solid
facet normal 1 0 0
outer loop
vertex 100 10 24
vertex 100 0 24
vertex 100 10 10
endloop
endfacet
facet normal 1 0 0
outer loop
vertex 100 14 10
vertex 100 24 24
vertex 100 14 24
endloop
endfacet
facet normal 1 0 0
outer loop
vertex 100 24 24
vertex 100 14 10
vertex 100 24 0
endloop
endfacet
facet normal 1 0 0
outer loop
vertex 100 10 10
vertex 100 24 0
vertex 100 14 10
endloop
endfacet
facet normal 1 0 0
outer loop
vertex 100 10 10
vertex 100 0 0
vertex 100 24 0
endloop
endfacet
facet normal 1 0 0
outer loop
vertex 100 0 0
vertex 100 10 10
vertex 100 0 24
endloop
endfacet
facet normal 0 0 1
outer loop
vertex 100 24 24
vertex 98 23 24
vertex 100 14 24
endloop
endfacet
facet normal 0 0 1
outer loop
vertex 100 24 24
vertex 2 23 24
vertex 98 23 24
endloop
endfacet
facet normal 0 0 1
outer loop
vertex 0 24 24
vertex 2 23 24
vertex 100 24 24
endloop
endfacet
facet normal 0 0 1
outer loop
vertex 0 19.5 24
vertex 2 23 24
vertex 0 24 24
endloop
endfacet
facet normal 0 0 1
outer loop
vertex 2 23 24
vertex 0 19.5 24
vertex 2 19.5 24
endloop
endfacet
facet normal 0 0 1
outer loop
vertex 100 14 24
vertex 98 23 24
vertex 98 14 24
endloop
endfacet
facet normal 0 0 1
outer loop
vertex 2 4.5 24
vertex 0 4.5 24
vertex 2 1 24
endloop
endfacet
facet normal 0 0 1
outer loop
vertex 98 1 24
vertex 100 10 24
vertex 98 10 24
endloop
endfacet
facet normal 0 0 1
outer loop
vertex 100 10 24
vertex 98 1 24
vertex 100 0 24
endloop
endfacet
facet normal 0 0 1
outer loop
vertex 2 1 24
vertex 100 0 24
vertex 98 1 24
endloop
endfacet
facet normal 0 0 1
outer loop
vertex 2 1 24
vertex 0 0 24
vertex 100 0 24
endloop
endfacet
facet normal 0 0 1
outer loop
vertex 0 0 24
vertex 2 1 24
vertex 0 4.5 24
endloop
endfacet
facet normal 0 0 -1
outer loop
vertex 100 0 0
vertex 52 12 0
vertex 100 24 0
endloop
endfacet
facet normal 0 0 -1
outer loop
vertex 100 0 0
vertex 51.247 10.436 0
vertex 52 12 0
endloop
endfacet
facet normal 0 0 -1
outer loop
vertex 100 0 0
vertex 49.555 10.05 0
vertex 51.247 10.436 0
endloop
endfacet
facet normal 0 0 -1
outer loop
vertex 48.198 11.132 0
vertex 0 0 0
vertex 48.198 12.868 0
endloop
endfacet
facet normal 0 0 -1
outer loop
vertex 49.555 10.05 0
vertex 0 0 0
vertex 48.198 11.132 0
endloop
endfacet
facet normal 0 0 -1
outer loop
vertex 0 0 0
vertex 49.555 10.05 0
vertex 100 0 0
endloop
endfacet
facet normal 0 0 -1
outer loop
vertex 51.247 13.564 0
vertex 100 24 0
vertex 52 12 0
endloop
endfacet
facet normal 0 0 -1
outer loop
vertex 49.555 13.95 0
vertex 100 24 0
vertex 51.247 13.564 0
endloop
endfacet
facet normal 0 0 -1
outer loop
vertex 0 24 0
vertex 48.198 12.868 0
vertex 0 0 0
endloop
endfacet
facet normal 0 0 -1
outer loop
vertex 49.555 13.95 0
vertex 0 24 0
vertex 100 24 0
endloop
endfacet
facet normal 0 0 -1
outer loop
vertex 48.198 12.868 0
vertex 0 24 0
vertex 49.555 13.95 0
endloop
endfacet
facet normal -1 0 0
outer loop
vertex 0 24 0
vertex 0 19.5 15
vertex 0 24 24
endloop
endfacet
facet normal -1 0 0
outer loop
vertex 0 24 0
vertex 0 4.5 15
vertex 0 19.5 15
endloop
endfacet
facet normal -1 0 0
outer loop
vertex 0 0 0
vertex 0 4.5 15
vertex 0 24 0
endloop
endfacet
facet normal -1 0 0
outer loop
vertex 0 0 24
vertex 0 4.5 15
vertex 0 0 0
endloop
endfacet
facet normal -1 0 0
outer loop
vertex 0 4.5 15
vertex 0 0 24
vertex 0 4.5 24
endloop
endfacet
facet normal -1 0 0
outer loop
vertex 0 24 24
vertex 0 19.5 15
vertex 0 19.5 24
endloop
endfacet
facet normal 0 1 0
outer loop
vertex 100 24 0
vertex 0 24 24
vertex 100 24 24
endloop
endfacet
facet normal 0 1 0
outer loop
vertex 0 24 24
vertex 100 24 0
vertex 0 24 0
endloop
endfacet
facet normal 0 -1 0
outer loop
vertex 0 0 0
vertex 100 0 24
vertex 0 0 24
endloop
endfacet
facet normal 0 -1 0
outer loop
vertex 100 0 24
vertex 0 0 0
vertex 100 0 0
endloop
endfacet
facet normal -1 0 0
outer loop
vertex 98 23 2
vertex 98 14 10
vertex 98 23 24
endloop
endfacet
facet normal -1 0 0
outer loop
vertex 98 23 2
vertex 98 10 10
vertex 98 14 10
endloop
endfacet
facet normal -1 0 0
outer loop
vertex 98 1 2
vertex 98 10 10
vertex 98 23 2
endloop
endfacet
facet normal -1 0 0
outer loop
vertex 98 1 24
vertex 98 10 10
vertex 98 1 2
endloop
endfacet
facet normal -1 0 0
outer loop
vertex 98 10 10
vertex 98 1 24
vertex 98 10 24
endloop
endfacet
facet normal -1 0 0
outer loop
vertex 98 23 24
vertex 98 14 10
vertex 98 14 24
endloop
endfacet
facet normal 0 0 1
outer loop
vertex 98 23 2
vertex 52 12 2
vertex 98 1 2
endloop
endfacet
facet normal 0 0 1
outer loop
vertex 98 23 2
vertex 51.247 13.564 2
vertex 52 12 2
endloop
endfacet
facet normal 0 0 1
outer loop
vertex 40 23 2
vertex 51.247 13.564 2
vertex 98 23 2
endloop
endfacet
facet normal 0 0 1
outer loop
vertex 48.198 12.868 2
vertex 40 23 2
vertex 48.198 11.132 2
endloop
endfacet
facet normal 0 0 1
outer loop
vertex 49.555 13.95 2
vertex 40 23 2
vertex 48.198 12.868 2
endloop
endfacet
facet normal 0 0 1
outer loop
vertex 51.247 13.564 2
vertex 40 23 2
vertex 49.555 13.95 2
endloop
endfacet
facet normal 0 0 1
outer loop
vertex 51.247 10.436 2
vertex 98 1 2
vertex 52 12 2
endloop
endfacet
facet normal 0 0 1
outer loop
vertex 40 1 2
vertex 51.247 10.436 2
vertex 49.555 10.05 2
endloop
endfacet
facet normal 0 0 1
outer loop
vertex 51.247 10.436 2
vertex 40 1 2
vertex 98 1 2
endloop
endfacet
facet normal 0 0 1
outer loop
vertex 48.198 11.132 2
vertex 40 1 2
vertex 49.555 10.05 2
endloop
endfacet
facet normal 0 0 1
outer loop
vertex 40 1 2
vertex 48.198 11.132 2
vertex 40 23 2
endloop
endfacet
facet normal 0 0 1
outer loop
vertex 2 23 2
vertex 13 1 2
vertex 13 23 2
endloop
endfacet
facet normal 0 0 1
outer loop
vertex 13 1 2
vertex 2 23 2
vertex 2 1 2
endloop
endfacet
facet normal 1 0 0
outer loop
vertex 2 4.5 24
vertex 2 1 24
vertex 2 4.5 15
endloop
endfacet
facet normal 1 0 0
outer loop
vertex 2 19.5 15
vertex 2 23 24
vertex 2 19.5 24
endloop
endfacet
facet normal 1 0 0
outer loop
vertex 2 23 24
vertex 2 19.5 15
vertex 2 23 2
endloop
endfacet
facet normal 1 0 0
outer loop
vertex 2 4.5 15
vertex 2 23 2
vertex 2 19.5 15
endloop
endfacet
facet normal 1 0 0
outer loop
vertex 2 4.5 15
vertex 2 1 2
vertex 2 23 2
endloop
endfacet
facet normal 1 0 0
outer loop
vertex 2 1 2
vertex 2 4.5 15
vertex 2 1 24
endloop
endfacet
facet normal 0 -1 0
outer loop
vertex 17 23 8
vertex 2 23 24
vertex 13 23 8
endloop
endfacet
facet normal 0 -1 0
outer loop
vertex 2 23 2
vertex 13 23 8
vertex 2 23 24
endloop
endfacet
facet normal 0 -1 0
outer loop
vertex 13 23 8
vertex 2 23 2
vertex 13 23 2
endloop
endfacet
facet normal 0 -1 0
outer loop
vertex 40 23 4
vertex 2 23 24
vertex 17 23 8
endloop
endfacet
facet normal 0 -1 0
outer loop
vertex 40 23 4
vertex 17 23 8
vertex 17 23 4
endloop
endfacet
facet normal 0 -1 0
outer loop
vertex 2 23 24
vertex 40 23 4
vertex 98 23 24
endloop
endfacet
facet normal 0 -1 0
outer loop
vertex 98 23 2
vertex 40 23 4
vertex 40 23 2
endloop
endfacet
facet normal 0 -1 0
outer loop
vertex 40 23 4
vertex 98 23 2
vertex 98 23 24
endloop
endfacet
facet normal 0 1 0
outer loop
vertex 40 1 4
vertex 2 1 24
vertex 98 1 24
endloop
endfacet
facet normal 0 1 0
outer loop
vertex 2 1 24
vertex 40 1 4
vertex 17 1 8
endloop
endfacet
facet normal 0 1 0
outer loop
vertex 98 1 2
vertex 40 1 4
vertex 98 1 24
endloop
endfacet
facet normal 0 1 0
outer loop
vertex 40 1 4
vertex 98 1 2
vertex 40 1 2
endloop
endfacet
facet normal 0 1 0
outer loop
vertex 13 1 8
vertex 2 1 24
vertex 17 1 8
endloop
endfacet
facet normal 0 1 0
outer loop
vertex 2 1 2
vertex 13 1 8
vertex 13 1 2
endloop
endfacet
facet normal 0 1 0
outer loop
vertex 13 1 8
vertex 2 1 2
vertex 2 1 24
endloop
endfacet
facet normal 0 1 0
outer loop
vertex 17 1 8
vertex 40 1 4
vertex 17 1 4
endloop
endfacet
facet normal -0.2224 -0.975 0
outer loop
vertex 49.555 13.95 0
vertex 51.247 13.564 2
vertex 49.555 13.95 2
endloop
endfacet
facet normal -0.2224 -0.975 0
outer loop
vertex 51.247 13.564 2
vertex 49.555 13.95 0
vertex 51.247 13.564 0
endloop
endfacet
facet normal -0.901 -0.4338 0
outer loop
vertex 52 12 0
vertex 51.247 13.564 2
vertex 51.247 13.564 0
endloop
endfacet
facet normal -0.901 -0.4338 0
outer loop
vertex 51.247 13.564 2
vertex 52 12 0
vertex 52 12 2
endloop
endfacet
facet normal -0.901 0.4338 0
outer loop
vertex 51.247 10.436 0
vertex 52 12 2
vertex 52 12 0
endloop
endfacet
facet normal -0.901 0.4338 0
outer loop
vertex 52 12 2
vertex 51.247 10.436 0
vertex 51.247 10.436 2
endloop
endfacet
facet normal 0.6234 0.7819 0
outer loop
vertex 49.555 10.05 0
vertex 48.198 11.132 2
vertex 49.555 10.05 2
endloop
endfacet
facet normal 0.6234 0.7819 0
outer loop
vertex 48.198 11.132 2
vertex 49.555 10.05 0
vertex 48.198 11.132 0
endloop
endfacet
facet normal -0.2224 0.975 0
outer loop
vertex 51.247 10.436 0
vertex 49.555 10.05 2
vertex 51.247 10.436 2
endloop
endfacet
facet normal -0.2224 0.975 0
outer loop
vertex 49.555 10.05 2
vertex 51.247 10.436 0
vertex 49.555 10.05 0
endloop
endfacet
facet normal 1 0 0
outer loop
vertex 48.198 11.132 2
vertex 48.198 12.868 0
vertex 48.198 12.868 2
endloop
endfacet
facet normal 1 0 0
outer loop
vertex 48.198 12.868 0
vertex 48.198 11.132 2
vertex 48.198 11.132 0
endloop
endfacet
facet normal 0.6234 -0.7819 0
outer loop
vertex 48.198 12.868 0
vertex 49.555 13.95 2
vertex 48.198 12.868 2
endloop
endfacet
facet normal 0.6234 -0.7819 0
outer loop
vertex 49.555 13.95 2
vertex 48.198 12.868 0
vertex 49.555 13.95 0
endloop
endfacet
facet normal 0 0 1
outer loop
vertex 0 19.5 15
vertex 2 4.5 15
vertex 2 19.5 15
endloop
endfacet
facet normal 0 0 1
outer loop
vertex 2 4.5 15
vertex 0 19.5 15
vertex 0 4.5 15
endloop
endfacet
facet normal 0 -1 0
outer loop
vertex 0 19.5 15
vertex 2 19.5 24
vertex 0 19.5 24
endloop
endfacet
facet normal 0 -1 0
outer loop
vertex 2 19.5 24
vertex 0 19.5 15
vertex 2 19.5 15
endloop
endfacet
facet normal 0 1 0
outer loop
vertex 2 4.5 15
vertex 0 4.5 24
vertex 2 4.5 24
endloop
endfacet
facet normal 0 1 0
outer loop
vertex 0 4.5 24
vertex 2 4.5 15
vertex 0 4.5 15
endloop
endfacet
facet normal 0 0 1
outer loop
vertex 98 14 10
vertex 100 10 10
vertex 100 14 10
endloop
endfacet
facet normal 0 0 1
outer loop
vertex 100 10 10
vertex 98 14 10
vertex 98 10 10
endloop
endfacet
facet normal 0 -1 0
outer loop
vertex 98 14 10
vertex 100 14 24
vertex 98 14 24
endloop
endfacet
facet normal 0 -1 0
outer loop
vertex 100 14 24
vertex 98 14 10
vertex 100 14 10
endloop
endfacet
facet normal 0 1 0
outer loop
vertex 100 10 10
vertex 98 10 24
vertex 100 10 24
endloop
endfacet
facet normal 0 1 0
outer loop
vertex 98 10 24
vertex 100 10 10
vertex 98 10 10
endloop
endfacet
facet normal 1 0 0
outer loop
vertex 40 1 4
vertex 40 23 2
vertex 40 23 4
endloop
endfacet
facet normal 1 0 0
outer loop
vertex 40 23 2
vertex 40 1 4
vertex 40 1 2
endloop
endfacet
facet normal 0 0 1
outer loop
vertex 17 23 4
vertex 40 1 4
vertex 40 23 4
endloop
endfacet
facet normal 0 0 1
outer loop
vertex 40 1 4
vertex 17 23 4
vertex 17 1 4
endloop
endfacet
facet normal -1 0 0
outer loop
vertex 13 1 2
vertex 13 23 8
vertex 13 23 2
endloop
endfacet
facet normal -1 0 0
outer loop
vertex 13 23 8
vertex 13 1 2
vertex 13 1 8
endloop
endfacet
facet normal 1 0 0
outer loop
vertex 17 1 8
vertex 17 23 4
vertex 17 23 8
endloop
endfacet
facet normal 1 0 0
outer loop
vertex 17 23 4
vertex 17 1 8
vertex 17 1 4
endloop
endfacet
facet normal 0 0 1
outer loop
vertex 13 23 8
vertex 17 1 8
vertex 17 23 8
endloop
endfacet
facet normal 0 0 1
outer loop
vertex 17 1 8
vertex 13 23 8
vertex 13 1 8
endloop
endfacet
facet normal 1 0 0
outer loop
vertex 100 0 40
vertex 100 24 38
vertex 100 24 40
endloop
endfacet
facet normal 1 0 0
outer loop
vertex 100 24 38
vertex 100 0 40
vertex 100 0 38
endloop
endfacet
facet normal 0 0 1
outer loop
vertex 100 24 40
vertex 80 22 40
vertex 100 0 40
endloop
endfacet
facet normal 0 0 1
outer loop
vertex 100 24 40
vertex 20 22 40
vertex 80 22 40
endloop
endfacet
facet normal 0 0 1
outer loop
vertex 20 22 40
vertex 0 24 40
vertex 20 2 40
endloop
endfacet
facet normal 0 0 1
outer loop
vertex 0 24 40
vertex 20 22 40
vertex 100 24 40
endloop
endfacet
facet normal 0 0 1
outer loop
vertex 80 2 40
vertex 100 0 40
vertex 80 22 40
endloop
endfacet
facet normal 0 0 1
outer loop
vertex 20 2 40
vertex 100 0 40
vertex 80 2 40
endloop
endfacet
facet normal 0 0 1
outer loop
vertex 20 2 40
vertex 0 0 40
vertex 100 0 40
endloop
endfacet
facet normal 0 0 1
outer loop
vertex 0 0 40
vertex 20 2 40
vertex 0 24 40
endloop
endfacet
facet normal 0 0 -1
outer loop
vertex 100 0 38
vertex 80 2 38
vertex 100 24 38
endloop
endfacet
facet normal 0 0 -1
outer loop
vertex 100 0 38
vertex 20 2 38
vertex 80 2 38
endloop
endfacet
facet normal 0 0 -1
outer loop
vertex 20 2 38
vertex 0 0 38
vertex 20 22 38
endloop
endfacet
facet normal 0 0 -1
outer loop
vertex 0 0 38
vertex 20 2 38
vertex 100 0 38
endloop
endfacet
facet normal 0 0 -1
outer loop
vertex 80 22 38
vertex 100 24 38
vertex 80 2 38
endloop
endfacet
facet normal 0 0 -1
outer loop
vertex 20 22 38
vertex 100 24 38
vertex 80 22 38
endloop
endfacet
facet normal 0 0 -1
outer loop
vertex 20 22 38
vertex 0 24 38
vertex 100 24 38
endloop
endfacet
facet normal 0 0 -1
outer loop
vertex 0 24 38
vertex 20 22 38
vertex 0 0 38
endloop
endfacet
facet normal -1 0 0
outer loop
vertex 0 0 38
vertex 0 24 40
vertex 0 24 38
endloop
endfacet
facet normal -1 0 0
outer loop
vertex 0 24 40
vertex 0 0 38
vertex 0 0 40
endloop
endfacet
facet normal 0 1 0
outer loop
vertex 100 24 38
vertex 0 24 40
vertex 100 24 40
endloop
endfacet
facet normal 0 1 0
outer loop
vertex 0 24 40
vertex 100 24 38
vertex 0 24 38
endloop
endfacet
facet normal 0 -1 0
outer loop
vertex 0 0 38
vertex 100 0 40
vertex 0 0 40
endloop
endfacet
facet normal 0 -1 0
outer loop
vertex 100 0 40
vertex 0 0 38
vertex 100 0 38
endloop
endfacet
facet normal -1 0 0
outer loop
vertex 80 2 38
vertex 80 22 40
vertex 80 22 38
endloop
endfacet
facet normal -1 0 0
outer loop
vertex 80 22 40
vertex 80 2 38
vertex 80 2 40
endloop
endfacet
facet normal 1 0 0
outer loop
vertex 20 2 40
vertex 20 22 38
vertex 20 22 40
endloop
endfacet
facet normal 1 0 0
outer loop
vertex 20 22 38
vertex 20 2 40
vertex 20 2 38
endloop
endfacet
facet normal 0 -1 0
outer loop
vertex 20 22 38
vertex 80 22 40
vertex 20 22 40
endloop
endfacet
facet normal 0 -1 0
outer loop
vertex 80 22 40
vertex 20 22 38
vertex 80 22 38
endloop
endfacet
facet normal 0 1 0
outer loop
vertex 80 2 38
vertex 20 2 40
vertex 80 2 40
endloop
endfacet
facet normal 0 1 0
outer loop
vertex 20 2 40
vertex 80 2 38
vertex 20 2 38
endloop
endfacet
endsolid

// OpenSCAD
// Box for 5v USB output buck converter with display
// and carrier board with ptc/rectifier/etc
// In this case taking AC from my HVAC

module box() {
    difference(){
        cube([100, 24, 24]);
        // Hollow It Out
        translate([2, 1, 2])
            cube([96, 22, 24]);
        // Screw Hole
        translate([50, 12, 0])
            cylinder(h=4, d=4);
        // USB Port
        translate([0, 4.5, 15])
            cube([2, 15, 10]);
        // Wire Slot
        translate([98, 10, 10])
            cube([2, 4, 15]);
    }
    translate([13, 0, 2])
        cube([27, 24 ,2]);
    translate([13, 0, 2])
        cube([4, 24 ,6]);
}

module lid() {
    difference(){
        cube([100, 24, 2]);
        // Hollow It Out
        translate([20, 2, 0])
            cube([60, 20, 2]);

    }
}

// Print box module
box();
// Lift the lid up a bit for a better view
translate([0, 0, 38])
// Print the lid module for the box
lid();
